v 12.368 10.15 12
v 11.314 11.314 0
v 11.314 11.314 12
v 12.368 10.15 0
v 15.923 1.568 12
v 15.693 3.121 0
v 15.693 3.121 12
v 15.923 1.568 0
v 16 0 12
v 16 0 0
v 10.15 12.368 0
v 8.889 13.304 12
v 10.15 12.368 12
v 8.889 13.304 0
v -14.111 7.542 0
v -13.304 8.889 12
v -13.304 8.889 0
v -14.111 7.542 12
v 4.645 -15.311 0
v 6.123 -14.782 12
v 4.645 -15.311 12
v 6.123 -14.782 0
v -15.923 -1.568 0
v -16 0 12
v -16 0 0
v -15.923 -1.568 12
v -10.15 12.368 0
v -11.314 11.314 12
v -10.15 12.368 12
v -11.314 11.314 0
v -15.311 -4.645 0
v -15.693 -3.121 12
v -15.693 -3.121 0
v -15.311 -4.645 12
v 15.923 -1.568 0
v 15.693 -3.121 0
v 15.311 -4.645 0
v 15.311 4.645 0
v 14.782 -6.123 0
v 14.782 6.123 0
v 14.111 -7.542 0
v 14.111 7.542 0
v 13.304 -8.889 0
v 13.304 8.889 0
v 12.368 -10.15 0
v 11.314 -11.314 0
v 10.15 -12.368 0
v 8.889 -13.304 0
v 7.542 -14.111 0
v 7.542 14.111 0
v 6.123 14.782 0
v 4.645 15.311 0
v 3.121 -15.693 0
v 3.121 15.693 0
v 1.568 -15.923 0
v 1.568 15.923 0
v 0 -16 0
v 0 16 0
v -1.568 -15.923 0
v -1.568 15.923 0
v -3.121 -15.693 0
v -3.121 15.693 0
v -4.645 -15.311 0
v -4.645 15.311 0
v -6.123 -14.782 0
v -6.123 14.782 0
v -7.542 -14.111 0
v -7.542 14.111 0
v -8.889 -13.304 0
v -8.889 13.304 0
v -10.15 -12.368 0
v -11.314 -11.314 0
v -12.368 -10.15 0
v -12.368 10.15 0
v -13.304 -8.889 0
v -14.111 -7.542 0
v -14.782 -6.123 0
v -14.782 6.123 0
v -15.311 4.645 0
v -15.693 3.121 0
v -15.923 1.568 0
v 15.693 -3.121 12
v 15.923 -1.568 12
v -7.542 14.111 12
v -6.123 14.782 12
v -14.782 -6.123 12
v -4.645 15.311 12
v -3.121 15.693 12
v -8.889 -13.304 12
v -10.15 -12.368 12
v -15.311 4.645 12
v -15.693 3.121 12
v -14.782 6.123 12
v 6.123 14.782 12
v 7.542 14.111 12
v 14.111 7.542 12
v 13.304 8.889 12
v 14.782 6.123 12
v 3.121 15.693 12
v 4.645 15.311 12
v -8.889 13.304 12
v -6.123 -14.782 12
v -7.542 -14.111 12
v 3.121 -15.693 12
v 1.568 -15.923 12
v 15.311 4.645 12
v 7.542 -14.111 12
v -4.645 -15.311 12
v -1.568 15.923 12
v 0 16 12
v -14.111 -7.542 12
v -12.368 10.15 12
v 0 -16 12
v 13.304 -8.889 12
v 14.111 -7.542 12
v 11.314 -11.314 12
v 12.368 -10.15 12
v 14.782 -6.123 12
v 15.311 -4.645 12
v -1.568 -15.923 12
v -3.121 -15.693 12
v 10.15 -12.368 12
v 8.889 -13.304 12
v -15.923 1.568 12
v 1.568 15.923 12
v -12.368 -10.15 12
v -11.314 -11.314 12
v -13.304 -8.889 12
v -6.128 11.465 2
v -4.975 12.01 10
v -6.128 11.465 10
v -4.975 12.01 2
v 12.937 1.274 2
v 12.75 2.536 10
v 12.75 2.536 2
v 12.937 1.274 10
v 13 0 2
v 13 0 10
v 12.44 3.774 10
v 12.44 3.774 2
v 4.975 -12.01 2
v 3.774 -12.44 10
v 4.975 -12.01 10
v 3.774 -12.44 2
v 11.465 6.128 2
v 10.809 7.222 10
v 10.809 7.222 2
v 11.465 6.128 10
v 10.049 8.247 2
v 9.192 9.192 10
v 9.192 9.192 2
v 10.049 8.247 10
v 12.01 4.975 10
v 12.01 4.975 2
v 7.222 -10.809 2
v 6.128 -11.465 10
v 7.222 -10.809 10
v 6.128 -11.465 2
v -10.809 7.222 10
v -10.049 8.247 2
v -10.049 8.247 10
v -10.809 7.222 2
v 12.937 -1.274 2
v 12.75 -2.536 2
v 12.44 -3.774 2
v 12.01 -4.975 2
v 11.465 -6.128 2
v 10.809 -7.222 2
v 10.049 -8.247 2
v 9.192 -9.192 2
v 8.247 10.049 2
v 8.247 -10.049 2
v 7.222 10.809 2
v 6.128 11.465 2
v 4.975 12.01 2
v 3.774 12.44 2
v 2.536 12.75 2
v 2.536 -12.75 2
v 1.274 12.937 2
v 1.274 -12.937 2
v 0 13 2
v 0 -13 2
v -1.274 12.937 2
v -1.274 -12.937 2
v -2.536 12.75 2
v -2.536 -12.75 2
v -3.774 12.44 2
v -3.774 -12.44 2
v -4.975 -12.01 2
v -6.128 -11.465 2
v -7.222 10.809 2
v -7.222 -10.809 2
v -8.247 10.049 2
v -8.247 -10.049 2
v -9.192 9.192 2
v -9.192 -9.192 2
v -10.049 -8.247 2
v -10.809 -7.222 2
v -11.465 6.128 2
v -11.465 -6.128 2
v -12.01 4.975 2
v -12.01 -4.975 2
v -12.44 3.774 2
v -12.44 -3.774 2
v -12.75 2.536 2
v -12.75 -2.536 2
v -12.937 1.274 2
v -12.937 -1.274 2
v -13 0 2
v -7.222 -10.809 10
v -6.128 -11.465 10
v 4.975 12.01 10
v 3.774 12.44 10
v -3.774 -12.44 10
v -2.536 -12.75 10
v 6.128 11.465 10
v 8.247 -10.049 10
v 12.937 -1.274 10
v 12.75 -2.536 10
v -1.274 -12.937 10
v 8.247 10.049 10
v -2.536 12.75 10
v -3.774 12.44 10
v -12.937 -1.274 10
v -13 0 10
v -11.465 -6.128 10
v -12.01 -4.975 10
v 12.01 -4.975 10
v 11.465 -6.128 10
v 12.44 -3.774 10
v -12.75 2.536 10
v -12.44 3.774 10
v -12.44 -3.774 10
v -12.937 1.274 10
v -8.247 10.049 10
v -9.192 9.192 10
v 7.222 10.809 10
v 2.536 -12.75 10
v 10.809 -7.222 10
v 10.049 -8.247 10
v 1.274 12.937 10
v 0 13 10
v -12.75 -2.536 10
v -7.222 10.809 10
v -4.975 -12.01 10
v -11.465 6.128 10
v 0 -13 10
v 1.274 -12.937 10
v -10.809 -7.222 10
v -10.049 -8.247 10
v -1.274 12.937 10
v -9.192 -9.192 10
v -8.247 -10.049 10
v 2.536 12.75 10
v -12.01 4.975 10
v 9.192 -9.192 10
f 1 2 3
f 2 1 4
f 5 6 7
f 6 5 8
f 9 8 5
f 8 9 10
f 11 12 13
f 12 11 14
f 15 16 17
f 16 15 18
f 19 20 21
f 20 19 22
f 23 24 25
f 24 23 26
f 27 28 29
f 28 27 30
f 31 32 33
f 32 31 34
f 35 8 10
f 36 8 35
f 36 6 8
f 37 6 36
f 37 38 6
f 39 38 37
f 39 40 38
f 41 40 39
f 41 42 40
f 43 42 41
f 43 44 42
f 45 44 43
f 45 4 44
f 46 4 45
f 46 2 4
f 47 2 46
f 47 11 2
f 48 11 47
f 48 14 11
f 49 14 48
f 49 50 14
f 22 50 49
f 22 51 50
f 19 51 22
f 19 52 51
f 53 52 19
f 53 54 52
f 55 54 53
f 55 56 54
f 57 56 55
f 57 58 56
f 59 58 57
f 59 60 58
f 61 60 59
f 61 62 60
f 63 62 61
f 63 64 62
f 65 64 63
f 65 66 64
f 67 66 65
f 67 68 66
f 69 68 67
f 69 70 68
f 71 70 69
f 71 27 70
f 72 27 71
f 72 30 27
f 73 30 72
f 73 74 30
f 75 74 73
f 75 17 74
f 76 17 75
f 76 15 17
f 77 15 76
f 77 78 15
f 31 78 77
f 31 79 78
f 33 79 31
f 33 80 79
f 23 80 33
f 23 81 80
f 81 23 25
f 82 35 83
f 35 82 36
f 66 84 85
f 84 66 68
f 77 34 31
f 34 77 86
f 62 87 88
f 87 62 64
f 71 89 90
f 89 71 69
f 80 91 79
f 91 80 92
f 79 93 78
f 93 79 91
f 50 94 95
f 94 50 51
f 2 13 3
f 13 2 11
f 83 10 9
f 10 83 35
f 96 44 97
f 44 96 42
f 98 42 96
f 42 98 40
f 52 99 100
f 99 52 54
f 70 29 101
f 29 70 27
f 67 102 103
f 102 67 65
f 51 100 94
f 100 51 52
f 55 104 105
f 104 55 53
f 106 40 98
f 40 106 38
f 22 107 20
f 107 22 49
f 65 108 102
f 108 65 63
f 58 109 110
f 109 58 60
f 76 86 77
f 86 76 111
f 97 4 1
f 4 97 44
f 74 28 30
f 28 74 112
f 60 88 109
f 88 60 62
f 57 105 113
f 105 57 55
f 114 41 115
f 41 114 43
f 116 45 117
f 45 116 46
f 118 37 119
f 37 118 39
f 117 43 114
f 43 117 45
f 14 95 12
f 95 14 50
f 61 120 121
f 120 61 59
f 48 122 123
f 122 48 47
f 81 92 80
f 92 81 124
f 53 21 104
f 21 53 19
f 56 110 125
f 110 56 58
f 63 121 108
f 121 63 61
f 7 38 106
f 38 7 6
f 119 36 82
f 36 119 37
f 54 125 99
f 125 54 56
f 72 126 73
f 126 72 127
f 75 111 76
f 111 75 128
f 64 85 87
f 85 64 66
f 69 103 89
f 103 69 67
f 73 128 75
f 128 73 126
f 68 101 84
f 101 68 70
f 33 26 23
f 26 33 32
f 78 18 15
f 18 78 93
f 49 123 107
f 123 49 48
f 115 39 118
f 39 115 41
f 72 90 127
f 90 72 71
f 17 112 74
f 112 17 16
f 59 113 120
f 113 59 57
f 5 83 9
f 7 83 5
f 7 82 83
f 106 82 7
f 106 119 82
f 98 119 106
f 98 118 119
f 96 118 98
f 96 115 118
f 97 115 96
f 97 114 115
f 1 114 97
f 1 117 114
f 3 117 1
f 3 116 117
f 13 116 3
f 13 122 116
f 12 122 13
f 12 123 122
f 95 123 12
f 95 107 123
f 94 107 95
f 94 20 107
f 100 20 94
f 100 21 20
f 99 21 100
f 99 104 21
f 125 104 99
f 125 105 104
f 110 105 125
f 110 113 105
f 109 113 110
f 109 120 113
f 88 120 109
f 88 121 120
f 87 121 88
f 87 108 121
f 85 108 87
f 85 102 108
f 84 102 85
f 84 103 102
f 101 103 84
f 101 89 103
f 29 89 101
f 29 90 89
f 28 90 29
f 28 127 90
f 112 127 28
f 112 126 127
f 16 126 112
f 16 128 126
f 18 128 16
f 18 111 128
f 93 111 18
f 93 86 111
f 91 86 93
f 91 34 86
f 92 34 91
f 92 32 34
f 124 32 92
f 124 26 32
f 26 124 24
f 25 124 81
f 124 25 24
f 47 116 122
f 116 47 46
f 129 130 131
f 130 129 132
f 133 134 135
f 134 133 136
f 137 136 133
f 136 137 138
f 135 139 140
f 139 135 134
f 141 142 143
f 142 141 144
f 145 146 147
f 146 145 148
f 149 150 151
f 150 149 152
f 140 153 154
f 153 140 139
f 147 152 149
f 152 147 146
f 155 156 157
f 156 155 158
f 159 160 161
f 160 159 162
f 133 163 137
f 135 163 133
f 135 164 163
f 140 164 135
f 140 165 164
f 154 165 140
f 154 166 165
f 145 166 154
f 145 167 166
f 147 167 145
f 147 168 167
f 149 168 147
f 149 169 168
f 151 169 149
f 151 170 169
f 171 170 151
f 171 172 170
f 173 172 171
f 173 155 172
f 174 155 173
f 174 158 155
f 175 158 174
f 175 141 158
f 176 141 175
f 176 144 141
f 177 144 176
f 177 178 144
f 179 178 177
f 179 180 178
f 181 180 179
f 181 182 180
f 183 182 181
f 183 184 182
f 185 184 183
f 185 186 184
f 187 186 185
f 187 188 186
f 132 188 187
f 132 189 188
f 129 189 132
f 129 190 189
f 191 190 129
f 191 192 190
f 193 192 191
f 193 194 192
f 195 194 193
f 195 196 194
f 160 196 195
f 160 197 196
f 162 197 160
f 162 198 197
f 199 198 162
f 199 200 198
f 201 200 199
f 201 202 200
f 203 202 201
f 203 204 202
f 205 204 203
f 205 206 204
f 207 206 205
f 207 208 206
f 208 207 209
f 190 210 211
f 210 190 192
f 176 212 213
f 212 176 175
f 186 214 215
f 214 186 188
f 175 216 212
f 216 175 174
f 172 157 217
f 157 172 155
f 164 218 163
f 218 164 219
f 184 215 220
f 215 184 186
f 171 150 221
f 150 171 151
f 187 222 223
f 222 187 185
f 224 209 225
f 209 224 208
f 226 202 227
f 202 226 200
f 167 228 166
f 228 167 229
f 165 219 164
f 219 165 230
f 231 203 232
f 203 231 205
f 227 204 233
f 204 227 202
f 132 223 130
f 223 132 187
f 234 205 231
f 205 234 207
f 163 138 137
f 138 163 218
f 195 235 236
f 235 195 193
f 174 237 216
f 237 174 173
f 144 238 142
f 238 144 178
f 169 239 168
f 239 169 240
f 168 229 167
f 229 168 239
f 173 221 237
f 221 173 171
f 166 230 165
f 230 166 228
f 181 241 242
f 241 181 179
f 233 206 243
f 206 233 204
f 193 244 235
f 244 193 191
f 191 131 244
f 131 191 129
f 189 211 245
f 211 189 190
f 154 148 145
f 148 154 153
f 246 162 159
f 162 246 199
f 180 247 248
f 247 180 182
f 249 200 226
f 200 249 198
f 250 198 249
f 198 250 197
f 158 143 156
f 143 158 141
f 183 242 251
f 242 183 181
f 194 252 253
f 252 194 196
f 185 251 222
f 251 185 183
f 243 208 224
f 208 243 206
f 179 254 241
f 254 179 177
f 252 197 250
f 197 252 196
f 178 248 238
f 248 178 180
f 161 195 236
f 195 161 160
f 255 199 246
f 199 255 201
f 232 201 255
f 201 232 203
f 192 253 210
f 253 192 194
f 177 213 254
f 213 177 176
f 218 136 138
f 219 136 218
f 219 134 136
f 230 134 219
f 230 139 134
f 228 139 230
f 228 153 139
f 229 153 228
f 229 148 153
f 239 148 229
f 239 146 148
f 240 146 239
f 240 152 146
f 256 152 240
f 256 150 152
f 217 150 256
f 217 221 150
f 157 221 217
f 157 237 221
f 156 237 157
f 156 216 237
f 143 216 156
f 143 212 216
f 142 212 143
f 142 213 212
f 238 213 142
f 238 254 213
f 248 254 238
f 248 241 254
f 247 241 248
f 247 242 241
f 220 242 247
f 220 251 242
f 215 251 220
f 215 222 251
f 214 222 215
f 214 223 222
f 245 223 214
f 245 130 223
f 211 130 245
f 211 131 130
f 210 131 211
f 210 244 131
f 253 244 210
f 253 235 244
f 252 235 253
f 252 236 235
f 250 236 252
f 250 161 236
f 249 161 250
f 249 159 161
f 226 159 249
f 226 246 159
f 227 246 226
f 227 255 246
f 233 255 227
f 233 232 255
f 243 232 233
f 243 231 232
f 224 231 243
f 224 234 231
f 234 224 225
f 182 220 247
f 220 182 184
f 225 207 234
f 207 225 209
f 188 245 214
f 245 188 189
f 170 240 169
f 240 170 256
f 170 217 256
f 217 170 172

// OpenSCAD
cap_od=32; cap_t=12; recess_r=13; recess_d=8;
difference(){ cylinder(h=cap_t,r=cap_od/2,$fn=64); translate([0,0,2]) cylinder(h=recess_d,r=recess_r,$fn=64); }
